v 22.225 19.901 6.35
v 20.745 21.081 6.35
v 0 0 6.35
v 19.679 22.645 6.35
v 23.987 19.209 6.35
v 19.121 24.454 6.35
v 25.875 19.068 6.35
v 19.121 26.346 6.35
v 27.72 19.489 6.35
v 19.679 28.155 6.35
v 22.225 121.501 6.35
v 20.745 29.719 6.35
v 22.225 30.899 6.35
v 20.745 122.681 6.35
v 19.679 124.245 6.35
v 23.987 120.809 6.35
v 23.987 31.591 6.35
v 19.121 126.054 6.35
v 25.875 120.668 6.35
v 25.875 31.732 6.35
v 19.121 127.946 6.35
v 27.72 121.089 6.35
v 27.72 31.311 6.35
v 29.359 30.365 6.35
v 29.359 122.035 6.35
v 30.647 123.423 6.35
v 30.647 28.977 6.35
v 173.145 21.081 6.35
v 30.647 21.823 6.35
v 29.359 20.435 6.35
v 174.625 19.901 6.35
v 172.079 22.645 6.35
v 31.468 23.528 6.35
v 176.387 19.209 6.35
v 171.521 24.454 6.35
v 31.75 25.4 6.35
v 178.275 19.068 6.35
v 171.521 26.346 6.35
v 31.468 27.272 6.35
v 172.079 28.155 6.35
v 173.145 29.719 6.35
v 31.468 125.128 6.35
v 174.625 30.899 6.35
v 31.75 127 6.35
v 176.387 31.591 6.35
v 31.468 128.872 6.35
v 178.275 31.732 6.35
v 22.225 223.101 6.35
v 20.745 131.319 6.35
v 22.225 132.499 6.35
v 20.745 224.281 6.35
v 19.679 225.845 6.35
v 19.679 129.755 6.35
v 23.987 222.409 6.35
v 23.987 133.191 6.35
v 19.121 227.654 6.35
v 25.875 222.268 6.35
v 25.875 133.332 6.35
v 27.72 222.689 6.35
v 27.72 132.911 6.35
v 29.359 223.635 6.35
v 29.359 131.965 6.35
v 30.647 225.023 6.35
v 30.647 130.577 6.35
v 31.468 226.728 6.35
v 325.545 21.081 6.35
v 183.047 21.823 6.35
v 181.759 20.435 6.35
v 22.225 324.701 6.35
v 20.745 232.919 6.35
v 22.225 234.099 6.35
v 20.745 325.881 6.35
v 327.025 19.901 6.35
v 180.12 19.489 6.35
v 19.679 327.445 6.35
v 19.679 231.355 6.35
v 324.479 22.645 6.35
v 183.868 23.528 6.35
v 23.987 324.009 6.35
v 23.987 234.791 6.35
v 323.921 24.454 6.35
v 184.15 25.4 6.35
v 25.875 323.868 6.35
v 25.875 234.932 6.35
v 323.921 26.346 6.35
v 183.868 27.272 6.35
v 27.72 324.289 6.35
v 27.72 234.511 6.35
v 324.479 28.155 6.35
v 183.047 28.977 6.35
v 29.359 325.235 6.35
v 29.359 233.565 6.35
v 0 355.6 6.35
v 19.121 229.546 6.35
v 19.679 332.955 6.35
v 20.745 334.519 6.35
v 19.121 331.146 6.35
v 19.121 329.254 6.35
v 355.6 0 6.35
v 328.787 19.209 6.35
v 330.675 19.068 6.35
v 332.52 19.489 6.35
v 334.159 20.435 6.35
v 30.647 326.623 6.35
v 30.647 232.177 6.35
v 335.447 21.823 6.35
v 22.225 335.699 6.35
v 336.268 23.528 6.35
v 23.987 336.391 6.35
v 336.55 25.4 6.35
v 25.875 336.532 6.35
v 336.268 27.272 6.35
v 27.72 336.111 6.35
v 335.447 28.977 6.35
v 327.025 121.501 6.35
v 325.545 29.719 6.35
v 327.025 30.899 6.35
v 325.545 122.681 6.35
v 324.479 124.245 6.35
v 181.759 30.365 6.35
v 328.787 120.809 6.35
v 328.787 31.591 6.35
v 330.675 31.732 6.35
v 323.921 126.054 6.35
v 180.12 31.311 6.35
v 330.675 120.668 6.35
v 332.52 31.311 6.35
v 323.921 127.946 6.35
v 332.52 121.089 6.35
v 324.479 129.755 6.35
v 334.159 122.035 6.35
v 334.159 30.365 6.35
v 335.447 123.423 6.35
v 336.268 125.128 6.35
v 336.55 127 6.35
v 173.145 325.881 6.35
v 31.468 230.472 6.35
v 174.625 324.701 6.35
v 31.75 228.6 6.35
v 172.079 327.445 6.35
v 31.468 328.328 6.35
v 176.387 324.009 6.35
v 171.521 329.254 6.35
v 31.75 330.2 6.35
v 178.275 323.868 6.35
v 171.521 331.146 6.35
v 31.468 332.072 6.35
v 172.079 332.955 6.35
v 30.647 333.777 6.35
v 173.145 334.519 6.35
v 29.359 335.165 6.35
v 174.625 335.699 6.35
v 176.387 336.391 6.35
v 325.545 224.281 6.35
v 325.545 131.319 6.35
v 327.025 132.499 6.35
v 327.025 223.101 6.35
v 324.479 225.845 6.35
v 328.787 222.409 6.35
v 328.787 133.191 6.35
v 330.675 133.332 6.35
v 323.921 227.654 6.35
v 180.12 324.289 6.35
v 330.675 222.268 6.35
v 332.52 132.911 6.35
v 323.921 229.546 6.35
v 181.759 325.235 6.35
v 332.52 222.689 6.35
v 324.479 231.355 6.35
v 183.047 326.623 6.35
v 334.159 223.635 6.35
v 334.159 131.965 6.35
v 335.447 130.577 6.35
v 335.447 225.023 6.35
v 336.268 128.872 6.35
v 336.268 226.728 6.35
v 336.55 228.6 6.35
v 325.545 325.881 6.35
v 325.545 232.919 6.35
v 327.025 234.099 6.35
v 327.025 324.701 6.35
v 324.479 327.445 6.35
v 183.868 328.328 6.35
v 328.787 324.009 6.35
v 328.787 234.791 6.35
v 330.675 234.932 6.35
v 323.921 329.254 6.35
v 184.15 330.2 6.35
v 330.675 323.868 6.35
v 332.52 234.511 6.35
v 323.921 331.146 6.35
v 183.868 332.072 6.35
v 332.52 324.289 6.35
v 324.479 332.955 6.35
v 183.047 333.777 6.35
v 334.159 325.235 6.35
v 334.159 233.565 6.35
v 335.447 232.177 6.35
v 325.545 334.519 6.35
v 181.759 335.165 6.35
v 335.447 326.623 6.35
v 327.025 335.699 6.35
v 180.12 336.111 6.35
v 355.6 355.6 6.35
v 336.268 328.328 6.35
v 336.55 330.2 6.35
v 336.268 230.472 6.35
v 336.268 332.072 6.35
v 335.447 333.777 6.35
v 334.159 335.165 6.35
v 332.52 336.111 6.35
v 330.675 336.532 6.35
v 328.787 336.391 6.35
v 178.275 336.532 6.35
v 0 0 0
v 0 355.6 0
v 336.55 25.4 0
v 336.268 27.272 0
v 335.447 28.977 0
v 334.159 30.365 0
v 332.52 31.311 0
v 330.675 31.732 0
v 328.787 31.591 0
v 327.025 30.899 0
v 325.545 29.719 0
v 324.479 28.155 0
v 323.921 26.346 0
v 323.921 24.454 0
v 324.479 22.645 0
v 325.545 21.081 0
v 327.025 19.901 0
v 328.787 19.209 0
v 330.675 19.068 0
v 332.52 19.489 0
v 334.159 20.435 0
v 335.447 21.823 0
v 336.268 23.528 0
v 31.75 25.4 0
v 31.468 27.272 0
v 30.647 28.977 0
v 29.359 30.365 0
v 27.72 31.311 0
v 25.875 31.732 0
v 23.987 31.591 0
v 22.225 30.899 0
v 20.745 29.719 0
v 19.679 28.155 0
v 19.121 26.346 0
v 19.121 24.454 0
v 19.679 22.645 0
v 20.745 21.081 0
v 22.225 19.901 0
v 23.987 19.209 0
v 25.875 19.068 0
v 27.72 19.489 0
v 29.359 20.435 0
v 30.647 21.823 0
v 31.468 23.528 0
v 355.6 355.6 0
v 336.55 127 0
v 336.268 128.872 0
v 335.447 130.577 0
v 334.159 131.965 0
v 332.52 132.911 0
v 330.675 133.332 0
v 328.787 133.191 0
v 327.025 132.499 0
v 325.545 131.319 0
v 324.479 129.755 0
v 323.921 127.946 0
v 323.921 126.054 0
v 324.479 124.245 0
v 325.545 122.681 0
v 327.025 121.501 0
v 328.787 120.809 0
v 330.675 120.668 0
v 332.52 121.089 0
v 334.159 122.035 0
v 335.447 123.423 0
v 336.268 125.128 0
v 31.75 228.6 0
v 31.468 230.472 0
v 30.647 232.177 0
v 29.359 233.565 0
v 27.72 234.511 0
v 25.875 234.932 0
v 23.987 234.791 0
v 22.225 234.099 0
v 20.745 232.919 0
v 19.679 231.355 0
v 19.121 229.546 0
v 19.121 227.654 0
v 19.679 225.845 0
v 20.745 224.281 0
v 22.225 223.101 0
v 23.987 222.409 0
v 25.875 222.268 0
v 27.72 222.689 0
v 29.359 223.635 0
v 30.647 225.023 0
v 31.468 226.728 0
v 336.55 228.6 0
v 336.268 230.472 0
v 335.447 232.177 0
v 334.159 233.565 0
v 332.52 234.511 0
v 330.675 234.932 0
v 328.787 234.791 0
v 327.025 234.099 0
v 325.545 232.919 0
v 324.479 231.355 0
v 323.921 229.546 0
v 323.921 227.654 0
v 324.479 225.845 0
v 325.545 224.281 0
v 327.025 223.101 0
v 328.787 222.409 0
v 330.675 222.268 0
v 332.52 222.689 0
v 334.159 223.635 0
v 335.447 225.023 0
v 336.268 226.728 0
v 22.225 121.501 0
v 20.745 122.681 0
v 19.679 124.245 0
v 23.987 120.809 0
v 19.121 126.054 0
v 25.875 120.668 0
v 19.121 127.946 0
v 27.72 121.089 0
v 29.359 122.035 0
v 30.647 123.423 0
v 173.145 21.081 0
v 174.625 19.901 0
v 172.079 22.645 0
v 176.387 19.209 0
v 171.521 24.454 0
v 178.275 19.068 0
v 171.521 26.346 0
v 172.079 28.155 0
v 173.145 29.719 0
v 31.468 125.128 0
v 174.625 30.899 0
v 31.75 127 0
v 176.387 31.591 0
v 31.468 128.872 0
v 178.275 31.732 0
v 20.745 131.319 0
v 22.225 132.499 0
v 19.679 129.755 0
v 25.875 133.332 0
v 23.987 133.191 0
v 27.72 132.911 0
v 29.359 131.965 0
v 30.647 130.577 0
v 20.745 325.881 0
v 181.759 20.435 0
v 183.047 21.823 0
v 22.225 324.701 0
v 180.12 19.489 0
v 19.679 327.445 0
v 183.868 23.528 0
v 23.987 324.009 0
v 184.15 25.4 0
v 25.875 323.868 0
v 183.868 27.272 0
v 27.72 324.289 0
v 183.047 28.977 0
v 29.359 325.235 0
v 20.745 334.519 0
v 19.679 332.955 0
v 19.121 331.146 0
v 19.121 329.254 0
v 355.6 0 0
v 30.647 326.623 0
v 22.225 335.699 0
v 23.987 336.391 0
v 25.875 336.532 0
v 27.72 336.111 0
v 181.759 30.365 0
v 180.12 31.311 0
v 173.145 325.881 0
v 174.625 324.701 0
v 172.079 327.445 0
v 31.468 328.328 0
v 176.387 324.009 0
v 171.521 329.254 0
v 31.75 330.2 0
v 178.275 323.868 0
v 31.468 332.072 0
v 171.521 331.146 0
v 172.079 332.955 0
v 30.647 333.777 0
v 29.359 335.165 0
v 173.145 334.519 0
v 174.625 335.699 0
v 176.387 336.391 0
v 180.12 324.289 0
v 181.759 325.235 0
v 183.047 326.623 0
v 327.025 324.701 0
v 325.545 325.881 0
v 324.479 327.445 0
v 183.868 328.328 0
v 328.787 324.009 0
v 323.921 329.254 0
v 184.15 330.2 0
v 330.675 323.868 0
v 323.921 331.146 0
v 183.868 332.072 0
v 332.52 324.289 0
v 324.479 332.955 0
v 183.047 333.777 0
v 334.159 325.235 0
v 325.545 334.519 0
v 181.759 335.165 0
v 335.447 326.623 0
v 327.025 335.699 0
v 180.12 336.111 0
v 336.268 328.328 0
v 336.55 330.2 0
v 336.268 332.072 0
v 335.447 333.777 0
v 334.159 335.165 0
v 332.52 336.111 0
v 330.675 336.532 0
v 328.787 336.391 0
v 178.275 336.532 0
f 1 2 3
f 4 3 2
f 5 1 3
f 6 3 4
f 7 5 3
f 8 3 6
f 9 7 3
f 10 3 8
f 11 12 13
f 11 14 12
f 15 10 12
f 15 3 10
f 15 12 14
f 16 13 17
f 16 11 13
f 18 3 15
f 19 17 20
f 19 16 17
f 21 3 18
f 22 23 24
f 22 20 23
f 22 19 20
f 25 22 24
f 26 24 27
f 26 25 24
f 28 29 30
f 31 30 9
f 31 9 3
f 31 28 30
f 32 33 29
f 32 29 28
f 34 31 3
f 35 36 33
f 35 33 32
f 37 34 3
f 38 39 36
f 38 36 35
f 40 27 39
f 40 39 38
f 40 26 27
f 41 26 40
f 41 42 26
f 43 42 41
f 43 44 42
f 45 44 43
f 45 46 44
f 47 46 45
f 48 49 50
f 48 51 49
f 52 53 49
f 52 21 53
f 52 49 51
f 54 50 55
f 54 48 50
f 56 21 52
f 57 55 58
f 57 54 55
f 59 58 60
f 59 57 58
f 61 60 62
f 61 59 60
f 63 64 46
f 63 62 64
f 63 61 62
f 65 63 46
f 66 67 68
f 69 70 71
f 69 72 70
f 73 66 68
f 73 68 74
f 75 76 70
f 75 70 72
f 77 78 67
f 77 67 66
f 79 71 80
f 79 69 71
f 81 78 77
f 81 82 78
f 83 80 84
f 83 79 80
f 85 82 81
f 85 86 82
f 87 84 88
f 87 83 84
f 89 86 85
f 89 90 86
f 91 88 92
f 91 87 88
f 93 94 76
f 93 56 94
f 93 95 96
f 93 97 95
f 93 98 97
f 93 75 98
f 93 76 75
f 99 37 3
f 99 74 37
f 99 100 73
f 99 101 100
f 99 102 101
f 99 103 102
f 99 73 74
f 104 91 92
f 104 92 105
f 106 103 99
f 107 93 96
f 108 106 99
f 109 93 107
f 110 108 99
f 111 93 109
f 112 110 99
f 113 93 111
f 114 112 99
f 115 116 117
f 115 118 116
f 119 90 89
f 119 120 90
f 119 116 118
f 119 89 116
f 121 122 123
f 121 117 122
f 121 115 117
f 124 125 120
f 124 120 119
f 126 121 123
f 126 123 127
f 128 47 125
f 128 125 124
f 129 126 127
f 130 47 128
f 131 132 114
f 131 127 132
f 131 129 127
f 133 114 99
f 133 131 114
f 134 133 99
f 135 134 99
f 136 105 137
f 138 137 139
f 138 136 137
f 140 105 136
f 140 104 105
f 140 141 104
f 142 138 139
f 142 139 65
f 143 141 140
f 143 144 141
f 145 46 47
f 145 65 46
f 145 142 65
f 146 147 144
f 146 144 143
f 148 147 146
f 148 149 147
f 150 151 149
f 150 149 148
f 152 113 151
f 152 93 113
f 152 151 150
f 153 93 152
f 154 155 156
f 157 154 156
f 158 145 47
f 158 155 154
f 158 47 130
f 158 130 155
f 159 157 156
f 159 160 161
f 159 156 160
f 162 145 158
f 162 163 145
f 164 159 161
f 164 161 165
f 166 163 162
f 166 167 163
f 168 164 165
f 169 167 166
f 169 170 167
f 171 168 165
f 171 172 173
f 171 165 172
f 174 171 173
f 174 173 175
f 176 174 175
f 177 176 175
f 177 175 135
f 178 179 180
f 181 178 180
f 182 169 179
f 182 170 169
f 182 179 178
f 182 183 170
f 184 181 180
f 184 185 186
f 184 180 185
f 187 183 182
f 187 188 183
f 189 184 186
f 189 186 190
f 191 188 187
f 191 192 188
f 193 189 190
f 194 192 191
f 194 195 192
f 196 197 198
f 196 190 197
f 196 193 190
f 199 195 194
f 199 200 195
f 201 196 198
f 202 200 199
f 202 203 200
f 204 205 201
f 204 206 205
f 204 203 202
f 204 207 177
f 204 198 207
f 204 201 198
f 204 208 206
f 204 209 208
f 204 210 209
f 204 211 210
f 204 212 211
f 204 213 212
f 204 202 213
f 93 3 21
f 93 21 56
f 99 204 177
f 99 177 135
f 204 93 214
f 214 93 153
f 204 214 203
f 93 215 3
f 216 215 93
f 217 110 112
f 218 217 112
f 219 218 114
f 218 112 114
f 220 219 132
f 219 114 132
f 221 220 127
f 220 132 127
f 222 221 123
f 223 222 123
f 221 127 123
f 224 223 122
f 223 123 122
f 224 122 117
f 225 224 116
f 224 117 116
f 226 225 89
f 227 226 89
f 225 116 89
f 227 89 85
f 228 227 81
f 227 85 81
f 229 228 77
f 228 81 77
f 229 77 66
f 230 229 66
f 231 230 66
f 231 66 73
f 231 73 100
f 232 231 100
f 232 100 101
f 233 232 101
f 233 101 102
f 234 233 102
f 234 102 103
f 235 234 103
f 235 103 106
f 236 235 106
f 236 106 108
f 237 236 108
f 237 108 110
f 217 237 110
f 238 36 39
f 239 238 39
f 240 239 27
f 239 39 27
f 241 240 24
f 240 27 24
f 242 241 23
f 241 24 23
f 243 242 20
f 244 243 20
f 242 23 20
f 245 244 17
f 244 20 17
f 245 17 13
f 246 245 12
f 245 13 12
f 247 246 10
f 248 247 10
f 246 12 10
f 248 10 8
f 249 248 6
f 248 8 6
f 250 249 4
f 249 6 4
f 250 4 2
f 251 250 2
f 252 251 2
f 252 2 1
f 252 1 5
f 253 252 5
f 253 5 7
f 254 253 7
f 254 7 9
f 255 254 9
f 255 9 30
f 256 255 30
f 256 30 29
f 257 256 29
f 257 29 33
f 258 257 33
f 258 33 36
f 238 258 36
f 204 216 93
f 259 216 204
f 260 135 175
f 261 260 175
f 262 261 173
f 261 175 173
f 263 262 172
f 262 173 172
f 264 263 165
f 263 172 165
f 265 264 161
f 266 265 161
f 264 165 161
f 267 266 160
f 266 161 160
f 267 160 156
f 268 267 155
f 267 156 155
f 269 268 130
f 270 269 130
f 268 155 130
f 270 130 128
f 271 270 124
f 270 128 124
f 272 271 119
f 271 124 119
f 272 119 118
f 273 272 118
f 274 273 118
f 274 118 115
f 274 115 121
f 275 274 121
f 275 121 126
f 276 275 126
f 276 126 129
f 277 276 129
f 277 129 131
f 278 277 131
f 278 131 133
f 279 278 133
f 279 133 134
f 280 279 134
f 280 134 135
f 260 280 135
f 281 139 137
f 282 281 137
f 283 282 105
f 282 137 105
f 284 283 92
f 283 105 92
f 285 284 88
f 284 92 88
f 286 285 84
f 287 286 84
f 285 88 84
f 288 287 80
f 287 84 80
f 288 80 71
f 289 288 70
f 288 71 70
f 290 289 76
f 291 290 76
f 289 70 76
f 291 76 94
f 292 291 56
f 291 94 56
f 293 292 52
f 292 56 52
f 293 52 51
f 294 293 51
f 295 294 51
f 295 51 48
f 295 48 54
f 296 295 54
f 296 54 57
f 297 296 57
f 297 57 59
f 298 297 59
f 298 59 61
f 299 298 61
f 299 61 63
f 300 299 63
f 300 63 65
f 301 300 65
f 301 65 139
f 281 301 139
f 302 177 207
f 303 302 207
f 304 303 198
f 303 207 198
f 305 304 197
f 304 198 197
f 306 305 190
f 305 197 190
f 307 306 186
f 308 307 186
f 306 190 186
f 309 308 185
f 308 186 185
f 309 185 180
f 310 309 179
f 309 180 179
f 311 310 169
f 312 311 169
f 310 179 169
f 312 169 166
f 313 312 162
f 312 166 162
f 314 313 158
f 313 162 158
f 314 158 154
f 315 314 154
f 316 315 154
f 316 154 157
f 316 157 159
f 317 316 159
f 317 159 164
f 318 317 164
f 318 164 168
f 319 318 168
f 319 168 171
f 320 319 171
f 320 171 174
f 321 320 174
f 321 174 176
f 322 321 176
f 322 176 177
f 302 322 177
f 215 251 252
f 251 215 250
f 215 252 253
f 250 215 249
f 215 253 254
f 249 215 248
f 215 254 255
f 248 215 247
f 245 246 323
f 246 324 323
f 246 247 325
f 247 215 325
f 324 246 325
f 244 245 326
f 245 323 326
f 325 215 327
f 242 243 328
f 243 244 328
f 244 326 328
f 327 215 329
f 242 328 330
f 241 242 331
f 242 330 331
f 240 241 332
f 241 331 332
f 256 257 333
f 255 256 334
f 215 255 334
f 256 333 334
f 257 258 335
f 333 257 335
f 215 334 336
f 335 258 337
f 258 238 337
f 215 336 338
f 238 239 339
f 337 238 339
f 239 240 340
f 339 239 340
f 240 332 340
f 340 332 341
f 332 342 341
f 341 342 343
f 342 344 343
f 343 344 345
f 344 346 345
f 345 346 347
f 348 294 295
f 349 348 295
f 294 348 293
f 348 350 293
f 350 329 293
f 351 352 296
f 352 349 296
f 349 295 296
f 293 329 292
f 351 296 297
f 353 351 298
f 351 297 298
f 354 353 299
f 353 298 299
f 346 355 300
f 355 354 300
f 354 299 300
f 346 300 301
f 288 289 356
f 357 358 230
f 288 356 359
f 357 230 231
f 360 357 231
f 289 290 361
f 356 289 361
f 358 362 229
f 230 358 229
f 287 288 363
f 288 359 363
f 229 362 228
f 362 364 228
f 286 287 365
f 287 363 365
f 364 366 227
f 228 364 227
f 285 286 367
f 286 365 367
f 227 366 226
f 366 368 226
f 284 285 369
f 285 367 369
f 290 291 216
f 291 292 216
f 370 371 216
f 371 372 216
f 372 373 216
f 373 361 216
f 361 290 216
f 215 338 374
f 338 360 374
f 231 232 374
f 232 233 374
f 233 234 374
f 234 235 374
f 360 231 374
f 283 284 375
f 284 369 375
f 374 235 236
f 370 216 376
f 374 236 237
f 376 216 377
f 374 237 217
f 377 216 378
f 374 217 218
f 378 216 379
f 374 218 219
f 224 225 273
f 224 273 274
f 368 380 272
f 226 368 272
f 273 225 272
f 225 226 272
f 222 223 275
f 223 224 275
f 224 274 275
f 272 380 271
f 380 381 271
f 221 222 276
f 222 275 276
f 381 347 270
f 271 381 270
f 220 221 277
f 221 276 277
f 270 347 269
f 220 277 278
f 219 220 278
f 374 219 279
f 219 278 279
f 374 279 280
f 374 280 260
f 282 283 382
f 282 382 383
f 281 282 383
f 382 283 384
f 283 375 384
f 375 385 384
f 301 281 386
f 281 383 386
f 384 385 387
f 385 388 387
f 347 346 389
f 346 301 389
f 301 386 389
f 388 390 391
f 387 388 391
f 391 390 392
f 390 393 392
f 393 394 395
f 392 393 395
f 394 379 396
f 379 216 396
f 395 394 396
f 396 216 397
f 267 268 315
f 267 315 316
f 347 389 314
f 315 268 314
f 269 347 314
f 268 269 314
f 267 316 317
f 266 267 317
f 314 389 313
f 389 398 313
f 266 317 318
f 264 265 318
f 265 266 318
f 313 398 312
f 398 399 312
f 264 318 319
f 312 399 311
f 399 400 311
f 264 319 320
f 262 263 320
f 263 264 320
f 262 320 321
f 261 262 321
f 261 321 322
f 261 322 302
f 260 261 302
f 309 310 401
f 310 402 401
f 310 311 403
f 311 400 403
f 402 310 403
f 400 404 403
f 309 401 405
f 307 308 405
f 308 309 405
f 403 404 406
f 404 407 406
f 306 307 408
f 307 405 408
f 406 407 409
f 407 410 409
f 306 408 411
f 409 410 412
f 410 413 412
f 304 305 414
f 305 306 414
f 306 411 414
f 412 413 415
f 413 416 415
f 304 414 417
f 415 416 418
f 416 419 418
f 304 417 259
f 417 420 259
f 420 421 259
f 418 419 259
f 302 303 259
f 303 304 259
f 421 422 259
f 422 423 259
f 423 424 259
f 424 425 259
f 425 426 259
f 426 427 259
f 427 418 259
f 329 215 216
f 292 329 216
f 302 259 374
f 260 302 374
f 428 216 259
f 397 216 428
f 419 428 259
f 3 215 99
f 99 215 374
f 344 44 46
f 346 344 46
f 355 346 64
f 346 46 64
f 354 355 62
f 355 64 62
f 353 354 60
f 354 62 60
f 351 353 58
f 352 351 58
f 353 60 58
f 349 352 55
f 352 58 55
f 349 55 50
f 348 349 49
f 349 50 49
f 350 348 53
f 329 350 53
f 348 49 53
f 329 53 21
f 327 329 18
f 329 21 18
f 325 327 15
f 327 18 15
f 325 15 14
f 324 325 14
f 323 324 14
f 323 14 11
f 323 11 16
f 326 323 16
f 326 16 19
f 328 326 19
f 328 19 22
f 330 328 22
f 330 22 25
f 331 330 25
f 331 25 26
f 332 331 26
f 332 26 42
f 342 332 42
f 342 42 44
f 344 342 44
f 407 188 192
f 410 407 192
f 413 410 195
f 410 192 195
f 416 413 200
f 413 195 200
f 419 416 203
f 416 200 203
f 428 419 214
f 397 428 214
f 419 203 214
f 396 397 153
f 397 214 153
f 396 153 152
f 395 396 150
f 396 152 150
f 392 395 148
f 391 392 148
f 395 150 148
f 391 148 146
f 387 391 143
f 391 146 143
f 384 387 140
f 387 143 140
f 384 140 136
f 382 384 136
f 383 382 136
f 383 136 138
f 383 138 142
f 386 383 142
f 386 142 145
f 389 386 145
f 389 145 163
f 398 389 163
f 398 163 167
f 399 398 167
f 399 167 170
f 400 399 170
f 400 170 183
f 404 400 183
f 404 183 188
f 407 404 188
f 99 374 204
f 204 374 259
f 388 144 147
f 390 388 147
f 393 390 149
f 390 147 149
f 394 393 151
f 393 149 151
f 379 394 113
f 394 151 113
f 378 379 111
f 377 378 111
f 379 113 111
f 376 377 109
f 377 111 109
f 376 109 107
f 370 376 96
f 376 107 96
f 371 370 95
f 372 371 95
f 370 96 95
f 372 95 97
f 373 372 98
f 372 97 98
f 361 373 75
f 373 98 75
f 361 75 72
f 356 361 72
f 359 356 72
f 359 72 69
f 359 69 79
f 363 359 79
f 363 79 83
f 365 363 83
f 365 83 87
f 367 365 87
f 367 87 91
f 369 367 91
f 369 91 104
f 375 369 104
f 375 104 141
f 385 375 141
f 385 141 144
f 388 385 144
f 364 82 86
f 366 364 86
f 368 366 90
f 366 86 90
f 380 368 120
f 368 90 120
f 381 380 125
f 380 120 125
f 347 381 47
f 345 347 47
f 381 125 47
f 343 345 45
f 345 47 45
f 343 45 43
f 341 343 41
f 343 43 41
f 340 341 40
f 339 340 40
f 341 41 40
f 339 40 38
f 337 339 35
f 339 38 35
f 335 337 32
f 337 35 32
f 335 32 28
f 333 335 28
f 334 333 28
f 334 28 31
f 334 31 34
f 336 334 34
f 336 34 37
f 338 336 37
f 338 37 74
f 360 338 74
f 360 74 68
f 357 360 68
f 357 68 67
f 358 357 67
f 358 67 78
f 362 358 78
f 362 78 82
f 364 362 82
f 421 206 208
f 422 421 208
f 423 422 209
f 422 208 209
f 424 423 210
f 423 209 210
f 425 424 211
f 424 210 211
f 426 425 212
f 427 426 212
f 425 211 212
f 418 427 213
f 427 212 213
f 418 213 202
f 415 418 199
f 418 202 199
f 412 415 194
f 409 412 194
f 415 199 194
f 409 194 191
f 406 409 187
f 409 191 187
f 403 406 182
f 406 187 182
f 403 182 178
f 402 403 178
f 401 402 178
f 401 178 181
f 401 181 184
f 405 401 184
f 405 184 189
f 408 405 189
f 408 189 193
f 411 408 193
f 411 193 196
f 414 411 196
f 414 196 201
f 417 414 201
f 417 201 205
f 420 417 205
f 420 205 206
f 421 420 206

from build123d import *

# Parameters (mm, degrees)
F0_W     = 355.6
F0_H     = 355.6
F1_DEPTH = 6.35
F2_R     = 6.35
F3_DEPTH = 25.4
F5_R     = 6.35
F6_DEPTH = 25.4


with BuildPart() as f1:
    # F0 (on Top) → F1 (new body)
    with BuildSketch(Plane.XY):
        with Locations((177.8, 177.8)):
            Rectangle(F0_W, F0_H)
    extrude(amount=F1_DEPTH)

    # F2 (on face) → F3 (cut)
    with BuildSketch(Plane.XY.offset(6.35)):
        with Locations((25.4, 228.6)):
            Circle(F2_R)
        with Locations((177.8, 330.2)):
            Circle(F2_R)
        with Locations((330.2, 228.6)):
            Circle(F2_R)
        with Locations((25.4, 127)):
            Circle(F2_R)
        with Locations((177.8, 25.4)):
            Circle(F2_R)
        with Locations((330.2, 127)):
            Circle(F2_R)
    extrude(amount=-F3_DEPTH, mode=Mode.SUBTRACT)

    # F5 (on face) → F6 (cut)
    with BuildSketch(Plane.XY.offset(6.35)):
        with Locations((25.4, 330.2)):
            Circle(F5_R)
        with Locations((330.2, 330.2)):
            Circle(F5_R)
        with Locations((25.4, 25.4)):
            Circle(F5_R)
        with Locations((330.2, 25.4)):
            Circle(F5_R)
    extrude(amount=-F6_DEPTH, mode=Mode.SUBTRACT)


solid = f1.part
